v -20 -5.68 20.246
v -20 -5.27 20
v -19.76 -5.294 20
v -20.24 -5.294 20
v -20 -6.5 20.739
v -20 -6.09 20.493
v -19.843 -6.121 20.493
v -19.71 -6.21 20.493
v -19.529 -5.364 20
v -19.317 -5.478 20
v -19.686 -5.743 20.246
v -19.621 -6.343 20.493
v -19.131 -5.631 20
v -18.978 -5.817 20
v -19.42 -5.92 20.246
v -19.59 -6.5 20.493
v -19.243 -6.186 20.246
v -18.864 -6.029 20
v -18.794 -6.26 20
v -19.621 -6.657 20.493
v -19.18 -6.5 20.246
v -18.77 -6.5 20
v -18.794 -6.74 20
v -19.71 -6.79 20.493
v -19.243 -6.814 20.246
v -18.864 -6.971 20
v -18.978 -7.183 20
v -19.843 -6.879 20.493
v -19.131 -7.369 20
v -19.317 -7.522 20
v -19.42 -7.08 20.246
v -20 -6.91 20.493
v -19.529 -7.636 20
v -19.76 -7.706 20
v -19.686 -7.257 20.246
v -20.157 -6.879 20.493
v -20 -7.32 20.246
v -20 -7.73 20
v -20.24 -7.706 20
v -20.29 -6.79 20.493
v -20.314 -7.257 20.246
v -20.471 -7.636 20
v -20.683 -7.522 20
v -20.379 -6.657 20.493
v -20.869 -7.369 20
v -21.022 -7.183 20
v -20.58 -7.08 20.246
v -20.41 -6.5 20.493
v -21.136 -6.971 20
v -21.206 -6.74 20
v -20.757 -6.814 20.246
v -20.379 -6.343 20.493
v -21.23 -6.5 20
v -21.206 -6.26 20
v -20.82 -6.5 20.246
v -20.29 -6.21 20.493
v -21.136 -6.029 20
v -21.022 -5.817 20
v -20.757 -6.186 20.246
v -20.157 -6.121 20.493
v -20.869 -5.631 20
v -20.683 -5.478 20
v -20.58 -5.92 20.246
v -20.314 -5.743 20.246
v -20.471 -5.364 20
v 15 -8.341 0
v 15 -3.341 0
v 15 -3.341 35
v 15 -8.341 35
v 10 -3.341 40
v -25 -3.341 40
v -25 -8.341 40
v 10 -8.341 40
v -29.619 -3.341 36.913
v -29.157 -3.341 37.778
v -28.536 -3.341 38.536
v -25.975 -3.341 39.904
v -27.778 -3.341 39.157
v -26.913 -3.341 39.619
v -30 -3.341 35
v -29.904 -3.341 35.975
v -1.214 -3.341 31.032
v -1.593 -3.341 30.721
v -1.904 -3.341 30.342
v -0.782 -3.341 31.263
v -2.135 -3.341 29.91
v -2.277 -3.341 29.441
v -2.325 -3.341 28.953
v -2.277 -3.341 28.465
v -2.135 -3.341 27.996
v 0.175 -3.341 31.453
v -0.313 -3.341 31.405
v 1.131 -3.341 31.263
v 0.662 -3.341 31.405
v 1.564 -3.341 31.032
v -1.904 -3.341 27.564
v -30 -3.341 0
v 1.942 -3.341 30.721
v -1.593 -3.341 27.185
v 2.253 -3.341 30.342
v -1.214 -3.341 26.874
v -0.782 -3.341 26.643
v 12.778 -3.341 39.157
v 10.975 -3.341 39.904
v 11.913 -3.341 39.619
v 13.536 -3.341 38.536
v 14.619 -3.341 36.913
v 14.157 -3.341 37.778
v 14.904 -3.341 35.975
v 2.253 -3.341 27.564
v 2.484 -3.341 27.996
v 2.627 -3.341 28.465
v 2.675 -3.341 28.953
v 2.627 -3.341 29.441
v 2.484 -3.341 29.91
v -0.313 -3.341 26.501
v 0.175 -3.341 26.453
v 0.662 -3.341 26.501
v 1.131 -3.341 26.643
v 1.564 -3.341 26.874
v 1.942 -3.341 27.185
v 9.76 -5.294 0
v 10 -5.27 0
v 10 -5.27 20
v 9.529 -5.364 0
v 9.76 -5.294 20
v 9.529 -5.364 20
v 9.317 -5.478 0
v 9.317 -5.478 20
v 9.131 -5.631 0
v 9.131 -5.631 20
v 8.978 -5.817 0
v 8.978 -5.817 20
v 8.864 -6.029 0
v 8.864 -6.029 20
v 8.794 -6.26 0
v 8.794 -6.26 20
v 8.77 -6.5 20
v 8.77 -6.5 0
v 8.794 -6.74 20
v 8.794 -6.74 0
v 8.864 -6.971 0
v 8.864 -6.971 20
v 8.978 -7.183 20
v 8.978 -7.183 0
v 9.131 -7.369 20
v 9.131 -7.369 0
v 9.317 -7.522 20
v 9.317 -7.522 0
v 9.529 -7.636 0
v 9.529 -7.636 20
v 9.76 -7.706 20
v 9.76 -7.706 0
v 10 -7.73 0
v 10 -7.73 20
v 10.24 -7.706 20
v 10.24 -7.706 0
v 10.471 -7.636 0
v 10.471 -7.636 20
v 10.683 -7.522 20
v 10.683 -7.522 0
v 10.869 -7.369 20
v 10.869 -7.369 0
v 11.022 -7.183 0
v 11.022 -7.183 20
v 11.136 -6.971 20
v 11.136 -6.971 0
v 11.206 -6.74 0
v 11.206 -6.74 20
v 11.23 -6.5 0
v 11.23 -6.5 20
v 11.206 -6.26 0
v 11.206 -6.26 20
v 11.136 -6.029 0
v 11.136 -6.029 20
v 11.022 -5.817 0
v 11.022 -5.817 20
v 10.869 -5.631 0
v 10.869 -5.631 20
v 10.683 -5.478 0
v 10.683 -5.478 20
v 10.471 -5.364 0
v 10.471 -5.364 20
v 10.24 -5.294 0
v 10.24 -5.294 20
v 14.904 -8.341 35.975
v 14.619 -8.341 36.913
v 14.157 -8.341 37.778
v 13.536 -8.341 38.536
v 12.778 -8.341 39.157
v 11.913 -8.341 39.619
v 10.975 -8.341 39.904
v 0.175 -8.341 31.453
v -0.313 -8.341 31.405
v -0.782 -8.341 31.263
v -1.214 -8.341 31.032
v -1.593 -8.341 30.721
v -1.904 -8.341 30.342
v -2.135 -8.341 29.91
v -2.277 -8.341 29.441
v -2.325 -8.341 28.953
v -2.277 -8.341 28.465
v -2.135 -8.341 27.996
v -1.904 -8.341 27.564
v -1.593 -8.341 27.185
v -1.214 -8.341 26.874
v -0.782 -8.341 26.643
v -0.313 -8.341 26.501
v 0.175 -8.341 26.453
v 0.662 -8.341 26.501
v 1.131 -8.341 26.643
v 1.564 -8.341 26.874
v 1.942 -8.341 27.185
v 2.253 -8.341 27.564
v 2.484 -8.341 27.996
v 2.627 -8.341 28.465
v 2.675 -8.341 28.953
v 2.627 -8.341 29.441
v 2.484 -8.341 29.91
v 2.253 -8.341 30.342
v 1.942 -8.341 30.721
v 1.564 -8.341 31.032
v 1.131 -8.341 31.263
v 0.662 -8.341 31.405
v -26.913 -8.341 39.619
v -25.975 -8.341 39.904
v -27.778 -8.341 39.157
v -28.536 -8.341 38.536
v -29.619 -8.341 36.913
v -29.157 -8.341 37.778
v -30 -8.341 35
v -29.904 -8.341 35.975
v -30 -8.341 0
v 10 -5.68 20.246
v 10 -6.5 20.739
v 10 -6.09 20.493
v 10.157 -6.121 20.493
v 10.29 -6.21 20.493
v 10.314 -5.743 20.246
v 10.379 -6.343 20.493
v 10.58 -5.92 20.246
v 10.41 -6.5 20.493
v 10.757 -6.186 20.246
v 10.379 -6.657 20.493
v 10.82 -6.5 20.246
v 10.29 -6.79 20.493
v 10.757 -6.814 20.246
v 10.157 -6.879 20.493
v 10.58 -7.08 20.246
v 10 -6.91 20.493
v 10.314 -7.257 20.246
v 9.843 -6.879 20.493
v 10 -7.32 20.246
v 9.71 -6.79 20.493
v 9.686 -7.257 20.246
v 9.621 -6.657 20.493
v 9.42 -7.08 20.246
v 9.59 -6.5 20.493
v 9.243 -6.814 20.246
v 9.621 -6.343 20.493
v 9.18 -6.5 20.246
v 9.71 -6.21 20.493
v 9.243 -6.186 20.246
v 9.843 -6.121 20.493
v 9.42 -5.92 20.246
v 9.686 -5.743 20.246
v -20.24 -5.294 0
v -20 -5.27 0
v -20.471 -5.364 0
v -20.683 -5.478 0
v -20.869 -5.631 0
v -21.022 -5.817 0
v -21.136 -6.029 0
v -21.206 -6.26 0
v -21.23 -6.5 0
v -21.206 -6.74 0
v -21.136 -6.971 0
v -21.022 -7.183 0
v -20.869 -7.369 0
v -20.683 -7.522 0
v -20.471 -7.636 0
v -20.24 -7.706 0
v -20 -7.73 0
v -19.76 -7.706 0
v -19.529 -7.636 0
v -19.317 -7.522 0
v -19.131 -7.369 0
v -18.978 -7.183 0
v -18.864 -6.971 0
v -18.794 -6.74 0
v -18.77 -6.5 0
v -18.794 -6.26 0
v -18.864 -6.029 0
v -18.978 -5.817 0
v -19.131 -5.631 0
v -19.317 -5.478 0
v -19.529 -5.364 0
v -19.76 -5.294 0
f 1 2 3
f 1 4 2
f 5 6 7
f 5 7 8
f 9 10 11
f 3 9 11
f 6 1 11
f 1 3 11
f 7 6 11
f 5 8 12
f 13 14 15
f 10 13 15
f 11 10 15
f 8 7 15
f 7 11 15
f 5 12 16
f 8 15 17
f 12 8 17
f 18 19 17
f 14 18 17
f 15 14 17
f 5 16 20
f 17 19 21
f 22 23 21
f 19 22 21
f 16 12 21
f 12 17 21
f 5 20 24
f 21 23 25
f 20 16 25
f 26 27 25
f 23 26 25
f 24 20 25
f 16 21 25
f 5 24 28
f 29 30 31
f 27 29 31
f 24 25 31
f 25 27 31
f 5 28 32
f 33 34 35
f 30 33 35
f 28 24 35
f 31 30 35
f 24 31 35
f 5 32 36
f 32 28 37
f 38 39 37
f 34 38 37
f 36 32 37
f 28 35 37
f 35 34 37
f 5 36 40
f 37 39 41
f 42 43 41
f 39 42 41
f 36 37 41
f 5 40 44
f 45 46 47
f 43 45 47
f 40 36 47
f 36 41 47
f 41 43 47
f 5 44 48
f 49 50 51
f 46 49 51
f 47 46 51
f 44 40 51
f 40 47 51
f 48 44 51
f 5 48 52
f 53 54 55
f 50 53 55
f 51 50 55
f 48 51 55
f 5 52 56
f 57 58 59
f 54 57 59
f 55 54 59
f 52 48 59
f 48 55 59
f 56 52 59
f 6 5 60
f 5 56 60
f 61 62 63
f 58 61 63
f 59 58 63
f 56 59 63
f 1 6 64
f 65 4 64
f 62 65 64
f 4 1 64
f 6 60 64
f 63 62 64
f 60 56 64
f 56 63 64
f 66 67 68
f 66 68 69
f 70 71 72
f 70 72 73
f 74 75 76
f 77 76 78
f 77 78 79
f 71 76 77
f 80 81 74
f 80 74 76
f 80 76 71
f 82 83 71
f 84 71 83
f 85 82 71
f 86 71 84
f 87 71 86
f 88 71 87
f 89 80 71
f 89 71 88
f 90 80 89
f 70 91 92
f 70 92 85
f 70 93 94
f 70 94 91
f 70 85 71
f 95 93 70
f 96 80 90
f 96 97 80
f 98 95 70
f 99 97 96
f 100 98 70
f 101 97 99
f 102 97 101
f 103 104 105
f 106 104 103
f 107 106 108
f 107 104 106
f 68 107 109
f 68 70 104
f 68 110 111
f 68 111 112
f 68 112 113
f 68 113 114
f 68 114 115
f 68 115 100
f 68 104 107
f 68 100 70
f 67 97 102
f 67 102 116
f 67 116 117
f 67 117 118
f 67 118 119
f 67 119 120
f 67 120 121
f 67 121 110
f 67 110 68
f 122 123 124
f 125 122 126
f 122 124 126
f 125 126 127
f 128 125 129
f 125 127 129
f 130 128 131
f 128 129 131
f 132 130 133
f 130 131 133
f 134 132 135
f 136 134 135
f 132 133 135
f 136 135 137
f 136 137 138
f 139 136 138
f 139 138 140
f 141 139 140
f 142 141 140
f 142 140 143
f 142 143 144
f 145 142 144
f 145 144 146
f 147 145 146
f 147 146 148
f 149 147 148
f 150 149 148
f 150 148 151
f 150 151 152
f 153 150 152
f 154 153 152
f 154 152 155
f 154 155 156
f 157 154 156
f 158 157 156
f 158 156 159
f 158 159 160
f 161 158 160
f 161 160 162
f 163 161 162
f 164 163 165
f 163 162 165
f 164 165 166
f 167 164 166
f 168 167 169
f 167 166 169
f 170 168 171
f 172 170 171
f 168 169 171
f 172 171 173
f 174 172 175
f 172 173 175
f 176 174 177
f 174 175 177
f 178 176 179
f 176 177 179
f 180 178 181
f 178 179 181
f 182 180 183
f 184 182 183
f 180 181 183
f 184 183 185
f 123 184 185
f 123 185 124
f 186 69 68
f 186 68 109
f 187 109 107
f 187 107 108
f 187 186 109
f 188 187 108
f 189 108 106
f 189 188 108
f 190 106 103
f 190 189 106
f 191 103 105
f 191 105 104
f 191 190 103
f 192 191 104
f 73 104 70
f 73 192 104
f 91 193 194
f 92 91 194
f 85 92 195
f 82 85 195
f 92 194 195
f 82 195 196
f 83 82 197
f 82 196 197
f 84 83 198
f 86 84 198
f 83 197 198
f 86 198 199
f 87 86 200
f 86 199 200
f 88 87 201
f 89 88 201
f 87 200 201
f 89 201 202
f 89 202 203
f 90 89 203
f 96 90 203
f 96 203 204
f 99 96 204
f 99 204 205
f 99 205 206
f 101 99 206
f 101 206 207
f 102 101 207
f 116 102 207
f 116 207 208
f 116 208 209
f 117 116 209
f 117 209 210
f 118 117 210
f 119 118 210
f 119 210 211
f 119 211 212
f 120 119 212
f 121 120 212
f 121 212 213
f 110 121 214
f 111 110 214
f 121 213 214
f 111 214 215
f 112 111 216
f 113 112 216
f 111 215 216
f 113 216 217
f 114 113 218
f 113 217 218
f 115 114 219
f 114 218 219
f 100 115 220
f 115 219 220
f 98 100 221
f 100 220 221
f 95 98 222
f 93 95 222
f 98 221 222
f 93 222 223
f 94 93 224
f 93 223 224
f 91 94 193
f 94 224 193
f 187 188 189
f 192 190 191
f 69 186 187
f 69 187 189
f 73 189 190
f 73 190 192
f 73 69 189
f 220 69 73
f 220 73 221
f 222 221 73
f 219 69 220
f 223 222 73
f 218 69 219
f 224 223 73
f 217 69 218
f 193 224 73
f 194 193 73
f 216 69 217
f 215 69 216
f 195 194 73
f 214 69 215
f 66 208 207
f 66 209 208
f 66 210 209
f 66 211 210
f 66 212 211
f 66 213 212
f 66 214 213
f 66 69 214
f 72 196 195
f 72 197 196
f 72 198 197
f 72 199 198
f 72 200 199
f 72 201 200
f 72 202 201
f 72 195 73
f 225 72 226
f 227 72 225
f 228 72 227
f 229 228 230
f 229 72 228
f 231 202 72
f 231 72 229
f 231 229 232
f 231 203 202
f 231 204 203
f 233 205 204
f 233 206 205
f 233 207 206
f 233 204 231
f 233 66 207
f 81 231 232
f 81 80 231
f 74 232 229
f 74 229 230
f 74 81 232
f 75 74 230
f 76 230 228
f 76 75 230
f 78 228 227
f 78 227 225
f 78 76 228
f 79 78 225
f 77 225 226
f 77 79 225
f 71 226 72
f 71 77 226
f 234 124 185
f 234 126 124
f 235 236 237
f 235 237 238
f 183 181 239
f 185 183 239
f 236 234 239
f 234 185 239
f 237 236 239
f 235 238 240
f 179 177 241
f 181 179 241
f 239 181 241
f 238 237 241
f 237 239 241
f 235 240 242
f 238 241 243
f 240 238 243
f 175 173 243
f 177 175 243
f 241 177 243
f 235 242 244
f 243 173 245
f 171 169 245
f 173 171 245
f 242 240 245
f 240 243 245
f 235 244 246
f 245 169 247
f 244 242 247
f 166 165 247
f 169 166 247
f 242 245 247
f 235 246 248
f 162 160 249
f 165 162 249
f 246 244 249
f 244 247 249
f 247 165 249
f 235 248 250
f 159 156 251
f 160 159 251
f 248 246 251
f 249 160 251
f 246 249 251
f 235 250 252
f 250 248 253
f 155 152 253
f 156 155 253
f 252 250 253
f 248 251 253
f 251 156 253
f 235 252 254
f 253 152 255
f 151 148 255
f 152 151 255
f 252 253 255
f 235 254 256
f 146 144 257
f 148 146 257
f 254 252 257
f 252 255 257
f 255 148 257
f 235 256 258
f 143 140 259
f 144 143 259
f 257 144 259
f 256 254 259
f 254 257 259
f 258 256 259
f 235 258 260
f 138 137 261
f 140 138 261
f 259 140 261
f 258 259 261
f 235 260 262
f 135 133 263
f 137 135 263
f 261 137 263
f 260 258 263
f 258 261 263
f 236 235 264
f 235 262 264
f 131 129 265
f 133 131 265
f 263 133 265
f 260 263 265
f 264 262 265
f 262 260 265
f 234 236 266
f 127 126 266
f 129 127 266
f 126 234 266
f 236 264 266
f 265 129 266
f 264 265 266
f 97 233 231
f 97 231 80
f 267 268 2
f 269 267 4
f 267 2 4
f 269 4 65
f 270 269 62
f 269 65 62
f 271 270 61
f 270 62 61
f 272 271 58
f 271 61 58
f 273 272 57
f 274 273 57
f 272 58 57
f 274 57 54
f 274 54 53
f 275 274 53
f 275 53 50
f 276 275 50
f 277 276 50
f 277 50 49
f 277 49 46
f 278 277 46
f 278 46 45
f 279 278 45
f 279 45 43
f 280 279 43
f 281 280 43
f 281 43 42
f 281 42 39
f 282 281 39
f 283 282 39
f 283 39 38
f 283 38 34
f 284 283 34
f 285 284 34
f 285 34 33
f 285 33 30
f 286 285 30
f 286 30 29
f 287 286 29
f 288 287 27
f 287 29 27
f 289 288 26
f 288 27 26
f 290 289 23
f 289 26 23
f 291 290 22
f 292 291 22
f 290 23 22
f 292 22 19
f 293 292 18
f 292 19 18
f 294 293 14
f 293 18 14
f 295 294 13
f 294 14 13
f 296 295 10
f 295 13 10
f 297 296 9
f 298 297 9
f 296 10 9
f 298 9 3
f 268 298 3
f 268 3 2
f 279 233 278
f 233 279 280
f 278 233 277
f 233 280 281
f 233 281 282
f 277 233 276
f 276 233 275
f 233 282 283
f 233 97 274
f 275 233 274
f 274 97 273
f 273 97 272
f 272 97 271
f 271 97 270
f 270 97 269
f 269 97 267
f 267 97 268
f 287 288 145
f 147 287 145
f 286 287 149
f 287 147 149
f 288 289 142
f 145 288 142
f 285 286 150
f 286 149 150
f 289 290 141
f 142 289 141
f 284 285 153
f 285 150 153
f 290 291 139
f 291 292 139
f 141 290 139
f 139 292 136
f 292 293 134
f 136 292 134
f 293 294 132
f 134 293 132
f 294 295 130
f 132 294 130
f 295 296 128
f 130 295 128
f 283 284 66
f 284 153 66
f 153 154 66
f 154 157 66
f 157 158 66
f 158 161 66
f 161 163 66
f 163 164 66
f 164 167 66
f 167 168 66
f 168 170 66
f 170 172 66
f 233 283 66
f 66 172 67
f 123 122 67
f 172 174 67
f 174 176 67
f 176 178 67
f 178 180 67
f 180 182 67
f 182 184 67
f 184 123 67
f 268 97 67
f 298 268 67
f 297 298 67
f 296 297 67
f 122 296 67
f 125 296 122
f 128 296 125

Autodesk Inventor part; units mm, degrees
ref_plane "YZ Plane" through (0, 0, 0) normal (1, 0, 0) x (0, 1, 0)
ref_plane "XZ Plane" through (0, 0, 0) normal (0, 1, 0) x (-1, 0, 0)
ref_plane "XY Plane" through (0, 0, 0) normal (0, 0, 1) x (1, 0, 0)
sketch "Sketch1" plane through (0, 0, 0) normal (0, 0, 1) x (1, 0, 0)
  line L0 (-30, -3.3413) -> (15, -3.3413)
  line L1 (15, -3.3413) -> (15, -8.3413)
  line L2 (15, -8.3413) -> (-30, -8.3413)
  line L3 (-30, -8.3413) -> (-30, -3.3413)
  line L4 (-30, -65) -> (-30, 65) projected
  line L5 (15, -7) -> (15, 7) projected
  line L6 (-24.8253, -20.3413) -> (25.1747, -20.3413) projected
  point P0 (0, 0)
  dimension "d0" = 5
  dimension "d1" = 12
extrude "Extrusion1" add sketch "Sketch1" along normal blind 40
fillet "Fillet1" radius 5 2 edges at (-30, -5.8413, 40) (15, -5.8413, 40)
sketch "Sketch2" plane through (-30, -3.3413, 0) normal (0, 1, 0) x (1, 0, 0)
  circle A0 centre (30.1747, -28.9529) radius 2.5 projected
  point P0 (30, 0)
hole "Hole1" at (0.1747, -3.3413, 28.9529) direction (0, -1, 0) diameter 5 depth 8 tip angle 118
sketch "Sketch3" plane through (0, 0, 0) normal (0, 0, -1) x (-1, 0, 0)
  circle A0 centre (-10, -6.5) radius 1.5 projected
  circle A1 centre (20, -6.5) radius 1.5 projected
  point P0 (0, 0)
hole "Hole2" at (10, -6.5, 0) at (-20, -6.5, 0) direction (0, 0, 1) diameter 2.459 depth 20 tip angle 118 thread size "M3x0.5" class "6H" standard "ISO Metric profile"
properties part number "Y-Umlenkrollenhalter"
